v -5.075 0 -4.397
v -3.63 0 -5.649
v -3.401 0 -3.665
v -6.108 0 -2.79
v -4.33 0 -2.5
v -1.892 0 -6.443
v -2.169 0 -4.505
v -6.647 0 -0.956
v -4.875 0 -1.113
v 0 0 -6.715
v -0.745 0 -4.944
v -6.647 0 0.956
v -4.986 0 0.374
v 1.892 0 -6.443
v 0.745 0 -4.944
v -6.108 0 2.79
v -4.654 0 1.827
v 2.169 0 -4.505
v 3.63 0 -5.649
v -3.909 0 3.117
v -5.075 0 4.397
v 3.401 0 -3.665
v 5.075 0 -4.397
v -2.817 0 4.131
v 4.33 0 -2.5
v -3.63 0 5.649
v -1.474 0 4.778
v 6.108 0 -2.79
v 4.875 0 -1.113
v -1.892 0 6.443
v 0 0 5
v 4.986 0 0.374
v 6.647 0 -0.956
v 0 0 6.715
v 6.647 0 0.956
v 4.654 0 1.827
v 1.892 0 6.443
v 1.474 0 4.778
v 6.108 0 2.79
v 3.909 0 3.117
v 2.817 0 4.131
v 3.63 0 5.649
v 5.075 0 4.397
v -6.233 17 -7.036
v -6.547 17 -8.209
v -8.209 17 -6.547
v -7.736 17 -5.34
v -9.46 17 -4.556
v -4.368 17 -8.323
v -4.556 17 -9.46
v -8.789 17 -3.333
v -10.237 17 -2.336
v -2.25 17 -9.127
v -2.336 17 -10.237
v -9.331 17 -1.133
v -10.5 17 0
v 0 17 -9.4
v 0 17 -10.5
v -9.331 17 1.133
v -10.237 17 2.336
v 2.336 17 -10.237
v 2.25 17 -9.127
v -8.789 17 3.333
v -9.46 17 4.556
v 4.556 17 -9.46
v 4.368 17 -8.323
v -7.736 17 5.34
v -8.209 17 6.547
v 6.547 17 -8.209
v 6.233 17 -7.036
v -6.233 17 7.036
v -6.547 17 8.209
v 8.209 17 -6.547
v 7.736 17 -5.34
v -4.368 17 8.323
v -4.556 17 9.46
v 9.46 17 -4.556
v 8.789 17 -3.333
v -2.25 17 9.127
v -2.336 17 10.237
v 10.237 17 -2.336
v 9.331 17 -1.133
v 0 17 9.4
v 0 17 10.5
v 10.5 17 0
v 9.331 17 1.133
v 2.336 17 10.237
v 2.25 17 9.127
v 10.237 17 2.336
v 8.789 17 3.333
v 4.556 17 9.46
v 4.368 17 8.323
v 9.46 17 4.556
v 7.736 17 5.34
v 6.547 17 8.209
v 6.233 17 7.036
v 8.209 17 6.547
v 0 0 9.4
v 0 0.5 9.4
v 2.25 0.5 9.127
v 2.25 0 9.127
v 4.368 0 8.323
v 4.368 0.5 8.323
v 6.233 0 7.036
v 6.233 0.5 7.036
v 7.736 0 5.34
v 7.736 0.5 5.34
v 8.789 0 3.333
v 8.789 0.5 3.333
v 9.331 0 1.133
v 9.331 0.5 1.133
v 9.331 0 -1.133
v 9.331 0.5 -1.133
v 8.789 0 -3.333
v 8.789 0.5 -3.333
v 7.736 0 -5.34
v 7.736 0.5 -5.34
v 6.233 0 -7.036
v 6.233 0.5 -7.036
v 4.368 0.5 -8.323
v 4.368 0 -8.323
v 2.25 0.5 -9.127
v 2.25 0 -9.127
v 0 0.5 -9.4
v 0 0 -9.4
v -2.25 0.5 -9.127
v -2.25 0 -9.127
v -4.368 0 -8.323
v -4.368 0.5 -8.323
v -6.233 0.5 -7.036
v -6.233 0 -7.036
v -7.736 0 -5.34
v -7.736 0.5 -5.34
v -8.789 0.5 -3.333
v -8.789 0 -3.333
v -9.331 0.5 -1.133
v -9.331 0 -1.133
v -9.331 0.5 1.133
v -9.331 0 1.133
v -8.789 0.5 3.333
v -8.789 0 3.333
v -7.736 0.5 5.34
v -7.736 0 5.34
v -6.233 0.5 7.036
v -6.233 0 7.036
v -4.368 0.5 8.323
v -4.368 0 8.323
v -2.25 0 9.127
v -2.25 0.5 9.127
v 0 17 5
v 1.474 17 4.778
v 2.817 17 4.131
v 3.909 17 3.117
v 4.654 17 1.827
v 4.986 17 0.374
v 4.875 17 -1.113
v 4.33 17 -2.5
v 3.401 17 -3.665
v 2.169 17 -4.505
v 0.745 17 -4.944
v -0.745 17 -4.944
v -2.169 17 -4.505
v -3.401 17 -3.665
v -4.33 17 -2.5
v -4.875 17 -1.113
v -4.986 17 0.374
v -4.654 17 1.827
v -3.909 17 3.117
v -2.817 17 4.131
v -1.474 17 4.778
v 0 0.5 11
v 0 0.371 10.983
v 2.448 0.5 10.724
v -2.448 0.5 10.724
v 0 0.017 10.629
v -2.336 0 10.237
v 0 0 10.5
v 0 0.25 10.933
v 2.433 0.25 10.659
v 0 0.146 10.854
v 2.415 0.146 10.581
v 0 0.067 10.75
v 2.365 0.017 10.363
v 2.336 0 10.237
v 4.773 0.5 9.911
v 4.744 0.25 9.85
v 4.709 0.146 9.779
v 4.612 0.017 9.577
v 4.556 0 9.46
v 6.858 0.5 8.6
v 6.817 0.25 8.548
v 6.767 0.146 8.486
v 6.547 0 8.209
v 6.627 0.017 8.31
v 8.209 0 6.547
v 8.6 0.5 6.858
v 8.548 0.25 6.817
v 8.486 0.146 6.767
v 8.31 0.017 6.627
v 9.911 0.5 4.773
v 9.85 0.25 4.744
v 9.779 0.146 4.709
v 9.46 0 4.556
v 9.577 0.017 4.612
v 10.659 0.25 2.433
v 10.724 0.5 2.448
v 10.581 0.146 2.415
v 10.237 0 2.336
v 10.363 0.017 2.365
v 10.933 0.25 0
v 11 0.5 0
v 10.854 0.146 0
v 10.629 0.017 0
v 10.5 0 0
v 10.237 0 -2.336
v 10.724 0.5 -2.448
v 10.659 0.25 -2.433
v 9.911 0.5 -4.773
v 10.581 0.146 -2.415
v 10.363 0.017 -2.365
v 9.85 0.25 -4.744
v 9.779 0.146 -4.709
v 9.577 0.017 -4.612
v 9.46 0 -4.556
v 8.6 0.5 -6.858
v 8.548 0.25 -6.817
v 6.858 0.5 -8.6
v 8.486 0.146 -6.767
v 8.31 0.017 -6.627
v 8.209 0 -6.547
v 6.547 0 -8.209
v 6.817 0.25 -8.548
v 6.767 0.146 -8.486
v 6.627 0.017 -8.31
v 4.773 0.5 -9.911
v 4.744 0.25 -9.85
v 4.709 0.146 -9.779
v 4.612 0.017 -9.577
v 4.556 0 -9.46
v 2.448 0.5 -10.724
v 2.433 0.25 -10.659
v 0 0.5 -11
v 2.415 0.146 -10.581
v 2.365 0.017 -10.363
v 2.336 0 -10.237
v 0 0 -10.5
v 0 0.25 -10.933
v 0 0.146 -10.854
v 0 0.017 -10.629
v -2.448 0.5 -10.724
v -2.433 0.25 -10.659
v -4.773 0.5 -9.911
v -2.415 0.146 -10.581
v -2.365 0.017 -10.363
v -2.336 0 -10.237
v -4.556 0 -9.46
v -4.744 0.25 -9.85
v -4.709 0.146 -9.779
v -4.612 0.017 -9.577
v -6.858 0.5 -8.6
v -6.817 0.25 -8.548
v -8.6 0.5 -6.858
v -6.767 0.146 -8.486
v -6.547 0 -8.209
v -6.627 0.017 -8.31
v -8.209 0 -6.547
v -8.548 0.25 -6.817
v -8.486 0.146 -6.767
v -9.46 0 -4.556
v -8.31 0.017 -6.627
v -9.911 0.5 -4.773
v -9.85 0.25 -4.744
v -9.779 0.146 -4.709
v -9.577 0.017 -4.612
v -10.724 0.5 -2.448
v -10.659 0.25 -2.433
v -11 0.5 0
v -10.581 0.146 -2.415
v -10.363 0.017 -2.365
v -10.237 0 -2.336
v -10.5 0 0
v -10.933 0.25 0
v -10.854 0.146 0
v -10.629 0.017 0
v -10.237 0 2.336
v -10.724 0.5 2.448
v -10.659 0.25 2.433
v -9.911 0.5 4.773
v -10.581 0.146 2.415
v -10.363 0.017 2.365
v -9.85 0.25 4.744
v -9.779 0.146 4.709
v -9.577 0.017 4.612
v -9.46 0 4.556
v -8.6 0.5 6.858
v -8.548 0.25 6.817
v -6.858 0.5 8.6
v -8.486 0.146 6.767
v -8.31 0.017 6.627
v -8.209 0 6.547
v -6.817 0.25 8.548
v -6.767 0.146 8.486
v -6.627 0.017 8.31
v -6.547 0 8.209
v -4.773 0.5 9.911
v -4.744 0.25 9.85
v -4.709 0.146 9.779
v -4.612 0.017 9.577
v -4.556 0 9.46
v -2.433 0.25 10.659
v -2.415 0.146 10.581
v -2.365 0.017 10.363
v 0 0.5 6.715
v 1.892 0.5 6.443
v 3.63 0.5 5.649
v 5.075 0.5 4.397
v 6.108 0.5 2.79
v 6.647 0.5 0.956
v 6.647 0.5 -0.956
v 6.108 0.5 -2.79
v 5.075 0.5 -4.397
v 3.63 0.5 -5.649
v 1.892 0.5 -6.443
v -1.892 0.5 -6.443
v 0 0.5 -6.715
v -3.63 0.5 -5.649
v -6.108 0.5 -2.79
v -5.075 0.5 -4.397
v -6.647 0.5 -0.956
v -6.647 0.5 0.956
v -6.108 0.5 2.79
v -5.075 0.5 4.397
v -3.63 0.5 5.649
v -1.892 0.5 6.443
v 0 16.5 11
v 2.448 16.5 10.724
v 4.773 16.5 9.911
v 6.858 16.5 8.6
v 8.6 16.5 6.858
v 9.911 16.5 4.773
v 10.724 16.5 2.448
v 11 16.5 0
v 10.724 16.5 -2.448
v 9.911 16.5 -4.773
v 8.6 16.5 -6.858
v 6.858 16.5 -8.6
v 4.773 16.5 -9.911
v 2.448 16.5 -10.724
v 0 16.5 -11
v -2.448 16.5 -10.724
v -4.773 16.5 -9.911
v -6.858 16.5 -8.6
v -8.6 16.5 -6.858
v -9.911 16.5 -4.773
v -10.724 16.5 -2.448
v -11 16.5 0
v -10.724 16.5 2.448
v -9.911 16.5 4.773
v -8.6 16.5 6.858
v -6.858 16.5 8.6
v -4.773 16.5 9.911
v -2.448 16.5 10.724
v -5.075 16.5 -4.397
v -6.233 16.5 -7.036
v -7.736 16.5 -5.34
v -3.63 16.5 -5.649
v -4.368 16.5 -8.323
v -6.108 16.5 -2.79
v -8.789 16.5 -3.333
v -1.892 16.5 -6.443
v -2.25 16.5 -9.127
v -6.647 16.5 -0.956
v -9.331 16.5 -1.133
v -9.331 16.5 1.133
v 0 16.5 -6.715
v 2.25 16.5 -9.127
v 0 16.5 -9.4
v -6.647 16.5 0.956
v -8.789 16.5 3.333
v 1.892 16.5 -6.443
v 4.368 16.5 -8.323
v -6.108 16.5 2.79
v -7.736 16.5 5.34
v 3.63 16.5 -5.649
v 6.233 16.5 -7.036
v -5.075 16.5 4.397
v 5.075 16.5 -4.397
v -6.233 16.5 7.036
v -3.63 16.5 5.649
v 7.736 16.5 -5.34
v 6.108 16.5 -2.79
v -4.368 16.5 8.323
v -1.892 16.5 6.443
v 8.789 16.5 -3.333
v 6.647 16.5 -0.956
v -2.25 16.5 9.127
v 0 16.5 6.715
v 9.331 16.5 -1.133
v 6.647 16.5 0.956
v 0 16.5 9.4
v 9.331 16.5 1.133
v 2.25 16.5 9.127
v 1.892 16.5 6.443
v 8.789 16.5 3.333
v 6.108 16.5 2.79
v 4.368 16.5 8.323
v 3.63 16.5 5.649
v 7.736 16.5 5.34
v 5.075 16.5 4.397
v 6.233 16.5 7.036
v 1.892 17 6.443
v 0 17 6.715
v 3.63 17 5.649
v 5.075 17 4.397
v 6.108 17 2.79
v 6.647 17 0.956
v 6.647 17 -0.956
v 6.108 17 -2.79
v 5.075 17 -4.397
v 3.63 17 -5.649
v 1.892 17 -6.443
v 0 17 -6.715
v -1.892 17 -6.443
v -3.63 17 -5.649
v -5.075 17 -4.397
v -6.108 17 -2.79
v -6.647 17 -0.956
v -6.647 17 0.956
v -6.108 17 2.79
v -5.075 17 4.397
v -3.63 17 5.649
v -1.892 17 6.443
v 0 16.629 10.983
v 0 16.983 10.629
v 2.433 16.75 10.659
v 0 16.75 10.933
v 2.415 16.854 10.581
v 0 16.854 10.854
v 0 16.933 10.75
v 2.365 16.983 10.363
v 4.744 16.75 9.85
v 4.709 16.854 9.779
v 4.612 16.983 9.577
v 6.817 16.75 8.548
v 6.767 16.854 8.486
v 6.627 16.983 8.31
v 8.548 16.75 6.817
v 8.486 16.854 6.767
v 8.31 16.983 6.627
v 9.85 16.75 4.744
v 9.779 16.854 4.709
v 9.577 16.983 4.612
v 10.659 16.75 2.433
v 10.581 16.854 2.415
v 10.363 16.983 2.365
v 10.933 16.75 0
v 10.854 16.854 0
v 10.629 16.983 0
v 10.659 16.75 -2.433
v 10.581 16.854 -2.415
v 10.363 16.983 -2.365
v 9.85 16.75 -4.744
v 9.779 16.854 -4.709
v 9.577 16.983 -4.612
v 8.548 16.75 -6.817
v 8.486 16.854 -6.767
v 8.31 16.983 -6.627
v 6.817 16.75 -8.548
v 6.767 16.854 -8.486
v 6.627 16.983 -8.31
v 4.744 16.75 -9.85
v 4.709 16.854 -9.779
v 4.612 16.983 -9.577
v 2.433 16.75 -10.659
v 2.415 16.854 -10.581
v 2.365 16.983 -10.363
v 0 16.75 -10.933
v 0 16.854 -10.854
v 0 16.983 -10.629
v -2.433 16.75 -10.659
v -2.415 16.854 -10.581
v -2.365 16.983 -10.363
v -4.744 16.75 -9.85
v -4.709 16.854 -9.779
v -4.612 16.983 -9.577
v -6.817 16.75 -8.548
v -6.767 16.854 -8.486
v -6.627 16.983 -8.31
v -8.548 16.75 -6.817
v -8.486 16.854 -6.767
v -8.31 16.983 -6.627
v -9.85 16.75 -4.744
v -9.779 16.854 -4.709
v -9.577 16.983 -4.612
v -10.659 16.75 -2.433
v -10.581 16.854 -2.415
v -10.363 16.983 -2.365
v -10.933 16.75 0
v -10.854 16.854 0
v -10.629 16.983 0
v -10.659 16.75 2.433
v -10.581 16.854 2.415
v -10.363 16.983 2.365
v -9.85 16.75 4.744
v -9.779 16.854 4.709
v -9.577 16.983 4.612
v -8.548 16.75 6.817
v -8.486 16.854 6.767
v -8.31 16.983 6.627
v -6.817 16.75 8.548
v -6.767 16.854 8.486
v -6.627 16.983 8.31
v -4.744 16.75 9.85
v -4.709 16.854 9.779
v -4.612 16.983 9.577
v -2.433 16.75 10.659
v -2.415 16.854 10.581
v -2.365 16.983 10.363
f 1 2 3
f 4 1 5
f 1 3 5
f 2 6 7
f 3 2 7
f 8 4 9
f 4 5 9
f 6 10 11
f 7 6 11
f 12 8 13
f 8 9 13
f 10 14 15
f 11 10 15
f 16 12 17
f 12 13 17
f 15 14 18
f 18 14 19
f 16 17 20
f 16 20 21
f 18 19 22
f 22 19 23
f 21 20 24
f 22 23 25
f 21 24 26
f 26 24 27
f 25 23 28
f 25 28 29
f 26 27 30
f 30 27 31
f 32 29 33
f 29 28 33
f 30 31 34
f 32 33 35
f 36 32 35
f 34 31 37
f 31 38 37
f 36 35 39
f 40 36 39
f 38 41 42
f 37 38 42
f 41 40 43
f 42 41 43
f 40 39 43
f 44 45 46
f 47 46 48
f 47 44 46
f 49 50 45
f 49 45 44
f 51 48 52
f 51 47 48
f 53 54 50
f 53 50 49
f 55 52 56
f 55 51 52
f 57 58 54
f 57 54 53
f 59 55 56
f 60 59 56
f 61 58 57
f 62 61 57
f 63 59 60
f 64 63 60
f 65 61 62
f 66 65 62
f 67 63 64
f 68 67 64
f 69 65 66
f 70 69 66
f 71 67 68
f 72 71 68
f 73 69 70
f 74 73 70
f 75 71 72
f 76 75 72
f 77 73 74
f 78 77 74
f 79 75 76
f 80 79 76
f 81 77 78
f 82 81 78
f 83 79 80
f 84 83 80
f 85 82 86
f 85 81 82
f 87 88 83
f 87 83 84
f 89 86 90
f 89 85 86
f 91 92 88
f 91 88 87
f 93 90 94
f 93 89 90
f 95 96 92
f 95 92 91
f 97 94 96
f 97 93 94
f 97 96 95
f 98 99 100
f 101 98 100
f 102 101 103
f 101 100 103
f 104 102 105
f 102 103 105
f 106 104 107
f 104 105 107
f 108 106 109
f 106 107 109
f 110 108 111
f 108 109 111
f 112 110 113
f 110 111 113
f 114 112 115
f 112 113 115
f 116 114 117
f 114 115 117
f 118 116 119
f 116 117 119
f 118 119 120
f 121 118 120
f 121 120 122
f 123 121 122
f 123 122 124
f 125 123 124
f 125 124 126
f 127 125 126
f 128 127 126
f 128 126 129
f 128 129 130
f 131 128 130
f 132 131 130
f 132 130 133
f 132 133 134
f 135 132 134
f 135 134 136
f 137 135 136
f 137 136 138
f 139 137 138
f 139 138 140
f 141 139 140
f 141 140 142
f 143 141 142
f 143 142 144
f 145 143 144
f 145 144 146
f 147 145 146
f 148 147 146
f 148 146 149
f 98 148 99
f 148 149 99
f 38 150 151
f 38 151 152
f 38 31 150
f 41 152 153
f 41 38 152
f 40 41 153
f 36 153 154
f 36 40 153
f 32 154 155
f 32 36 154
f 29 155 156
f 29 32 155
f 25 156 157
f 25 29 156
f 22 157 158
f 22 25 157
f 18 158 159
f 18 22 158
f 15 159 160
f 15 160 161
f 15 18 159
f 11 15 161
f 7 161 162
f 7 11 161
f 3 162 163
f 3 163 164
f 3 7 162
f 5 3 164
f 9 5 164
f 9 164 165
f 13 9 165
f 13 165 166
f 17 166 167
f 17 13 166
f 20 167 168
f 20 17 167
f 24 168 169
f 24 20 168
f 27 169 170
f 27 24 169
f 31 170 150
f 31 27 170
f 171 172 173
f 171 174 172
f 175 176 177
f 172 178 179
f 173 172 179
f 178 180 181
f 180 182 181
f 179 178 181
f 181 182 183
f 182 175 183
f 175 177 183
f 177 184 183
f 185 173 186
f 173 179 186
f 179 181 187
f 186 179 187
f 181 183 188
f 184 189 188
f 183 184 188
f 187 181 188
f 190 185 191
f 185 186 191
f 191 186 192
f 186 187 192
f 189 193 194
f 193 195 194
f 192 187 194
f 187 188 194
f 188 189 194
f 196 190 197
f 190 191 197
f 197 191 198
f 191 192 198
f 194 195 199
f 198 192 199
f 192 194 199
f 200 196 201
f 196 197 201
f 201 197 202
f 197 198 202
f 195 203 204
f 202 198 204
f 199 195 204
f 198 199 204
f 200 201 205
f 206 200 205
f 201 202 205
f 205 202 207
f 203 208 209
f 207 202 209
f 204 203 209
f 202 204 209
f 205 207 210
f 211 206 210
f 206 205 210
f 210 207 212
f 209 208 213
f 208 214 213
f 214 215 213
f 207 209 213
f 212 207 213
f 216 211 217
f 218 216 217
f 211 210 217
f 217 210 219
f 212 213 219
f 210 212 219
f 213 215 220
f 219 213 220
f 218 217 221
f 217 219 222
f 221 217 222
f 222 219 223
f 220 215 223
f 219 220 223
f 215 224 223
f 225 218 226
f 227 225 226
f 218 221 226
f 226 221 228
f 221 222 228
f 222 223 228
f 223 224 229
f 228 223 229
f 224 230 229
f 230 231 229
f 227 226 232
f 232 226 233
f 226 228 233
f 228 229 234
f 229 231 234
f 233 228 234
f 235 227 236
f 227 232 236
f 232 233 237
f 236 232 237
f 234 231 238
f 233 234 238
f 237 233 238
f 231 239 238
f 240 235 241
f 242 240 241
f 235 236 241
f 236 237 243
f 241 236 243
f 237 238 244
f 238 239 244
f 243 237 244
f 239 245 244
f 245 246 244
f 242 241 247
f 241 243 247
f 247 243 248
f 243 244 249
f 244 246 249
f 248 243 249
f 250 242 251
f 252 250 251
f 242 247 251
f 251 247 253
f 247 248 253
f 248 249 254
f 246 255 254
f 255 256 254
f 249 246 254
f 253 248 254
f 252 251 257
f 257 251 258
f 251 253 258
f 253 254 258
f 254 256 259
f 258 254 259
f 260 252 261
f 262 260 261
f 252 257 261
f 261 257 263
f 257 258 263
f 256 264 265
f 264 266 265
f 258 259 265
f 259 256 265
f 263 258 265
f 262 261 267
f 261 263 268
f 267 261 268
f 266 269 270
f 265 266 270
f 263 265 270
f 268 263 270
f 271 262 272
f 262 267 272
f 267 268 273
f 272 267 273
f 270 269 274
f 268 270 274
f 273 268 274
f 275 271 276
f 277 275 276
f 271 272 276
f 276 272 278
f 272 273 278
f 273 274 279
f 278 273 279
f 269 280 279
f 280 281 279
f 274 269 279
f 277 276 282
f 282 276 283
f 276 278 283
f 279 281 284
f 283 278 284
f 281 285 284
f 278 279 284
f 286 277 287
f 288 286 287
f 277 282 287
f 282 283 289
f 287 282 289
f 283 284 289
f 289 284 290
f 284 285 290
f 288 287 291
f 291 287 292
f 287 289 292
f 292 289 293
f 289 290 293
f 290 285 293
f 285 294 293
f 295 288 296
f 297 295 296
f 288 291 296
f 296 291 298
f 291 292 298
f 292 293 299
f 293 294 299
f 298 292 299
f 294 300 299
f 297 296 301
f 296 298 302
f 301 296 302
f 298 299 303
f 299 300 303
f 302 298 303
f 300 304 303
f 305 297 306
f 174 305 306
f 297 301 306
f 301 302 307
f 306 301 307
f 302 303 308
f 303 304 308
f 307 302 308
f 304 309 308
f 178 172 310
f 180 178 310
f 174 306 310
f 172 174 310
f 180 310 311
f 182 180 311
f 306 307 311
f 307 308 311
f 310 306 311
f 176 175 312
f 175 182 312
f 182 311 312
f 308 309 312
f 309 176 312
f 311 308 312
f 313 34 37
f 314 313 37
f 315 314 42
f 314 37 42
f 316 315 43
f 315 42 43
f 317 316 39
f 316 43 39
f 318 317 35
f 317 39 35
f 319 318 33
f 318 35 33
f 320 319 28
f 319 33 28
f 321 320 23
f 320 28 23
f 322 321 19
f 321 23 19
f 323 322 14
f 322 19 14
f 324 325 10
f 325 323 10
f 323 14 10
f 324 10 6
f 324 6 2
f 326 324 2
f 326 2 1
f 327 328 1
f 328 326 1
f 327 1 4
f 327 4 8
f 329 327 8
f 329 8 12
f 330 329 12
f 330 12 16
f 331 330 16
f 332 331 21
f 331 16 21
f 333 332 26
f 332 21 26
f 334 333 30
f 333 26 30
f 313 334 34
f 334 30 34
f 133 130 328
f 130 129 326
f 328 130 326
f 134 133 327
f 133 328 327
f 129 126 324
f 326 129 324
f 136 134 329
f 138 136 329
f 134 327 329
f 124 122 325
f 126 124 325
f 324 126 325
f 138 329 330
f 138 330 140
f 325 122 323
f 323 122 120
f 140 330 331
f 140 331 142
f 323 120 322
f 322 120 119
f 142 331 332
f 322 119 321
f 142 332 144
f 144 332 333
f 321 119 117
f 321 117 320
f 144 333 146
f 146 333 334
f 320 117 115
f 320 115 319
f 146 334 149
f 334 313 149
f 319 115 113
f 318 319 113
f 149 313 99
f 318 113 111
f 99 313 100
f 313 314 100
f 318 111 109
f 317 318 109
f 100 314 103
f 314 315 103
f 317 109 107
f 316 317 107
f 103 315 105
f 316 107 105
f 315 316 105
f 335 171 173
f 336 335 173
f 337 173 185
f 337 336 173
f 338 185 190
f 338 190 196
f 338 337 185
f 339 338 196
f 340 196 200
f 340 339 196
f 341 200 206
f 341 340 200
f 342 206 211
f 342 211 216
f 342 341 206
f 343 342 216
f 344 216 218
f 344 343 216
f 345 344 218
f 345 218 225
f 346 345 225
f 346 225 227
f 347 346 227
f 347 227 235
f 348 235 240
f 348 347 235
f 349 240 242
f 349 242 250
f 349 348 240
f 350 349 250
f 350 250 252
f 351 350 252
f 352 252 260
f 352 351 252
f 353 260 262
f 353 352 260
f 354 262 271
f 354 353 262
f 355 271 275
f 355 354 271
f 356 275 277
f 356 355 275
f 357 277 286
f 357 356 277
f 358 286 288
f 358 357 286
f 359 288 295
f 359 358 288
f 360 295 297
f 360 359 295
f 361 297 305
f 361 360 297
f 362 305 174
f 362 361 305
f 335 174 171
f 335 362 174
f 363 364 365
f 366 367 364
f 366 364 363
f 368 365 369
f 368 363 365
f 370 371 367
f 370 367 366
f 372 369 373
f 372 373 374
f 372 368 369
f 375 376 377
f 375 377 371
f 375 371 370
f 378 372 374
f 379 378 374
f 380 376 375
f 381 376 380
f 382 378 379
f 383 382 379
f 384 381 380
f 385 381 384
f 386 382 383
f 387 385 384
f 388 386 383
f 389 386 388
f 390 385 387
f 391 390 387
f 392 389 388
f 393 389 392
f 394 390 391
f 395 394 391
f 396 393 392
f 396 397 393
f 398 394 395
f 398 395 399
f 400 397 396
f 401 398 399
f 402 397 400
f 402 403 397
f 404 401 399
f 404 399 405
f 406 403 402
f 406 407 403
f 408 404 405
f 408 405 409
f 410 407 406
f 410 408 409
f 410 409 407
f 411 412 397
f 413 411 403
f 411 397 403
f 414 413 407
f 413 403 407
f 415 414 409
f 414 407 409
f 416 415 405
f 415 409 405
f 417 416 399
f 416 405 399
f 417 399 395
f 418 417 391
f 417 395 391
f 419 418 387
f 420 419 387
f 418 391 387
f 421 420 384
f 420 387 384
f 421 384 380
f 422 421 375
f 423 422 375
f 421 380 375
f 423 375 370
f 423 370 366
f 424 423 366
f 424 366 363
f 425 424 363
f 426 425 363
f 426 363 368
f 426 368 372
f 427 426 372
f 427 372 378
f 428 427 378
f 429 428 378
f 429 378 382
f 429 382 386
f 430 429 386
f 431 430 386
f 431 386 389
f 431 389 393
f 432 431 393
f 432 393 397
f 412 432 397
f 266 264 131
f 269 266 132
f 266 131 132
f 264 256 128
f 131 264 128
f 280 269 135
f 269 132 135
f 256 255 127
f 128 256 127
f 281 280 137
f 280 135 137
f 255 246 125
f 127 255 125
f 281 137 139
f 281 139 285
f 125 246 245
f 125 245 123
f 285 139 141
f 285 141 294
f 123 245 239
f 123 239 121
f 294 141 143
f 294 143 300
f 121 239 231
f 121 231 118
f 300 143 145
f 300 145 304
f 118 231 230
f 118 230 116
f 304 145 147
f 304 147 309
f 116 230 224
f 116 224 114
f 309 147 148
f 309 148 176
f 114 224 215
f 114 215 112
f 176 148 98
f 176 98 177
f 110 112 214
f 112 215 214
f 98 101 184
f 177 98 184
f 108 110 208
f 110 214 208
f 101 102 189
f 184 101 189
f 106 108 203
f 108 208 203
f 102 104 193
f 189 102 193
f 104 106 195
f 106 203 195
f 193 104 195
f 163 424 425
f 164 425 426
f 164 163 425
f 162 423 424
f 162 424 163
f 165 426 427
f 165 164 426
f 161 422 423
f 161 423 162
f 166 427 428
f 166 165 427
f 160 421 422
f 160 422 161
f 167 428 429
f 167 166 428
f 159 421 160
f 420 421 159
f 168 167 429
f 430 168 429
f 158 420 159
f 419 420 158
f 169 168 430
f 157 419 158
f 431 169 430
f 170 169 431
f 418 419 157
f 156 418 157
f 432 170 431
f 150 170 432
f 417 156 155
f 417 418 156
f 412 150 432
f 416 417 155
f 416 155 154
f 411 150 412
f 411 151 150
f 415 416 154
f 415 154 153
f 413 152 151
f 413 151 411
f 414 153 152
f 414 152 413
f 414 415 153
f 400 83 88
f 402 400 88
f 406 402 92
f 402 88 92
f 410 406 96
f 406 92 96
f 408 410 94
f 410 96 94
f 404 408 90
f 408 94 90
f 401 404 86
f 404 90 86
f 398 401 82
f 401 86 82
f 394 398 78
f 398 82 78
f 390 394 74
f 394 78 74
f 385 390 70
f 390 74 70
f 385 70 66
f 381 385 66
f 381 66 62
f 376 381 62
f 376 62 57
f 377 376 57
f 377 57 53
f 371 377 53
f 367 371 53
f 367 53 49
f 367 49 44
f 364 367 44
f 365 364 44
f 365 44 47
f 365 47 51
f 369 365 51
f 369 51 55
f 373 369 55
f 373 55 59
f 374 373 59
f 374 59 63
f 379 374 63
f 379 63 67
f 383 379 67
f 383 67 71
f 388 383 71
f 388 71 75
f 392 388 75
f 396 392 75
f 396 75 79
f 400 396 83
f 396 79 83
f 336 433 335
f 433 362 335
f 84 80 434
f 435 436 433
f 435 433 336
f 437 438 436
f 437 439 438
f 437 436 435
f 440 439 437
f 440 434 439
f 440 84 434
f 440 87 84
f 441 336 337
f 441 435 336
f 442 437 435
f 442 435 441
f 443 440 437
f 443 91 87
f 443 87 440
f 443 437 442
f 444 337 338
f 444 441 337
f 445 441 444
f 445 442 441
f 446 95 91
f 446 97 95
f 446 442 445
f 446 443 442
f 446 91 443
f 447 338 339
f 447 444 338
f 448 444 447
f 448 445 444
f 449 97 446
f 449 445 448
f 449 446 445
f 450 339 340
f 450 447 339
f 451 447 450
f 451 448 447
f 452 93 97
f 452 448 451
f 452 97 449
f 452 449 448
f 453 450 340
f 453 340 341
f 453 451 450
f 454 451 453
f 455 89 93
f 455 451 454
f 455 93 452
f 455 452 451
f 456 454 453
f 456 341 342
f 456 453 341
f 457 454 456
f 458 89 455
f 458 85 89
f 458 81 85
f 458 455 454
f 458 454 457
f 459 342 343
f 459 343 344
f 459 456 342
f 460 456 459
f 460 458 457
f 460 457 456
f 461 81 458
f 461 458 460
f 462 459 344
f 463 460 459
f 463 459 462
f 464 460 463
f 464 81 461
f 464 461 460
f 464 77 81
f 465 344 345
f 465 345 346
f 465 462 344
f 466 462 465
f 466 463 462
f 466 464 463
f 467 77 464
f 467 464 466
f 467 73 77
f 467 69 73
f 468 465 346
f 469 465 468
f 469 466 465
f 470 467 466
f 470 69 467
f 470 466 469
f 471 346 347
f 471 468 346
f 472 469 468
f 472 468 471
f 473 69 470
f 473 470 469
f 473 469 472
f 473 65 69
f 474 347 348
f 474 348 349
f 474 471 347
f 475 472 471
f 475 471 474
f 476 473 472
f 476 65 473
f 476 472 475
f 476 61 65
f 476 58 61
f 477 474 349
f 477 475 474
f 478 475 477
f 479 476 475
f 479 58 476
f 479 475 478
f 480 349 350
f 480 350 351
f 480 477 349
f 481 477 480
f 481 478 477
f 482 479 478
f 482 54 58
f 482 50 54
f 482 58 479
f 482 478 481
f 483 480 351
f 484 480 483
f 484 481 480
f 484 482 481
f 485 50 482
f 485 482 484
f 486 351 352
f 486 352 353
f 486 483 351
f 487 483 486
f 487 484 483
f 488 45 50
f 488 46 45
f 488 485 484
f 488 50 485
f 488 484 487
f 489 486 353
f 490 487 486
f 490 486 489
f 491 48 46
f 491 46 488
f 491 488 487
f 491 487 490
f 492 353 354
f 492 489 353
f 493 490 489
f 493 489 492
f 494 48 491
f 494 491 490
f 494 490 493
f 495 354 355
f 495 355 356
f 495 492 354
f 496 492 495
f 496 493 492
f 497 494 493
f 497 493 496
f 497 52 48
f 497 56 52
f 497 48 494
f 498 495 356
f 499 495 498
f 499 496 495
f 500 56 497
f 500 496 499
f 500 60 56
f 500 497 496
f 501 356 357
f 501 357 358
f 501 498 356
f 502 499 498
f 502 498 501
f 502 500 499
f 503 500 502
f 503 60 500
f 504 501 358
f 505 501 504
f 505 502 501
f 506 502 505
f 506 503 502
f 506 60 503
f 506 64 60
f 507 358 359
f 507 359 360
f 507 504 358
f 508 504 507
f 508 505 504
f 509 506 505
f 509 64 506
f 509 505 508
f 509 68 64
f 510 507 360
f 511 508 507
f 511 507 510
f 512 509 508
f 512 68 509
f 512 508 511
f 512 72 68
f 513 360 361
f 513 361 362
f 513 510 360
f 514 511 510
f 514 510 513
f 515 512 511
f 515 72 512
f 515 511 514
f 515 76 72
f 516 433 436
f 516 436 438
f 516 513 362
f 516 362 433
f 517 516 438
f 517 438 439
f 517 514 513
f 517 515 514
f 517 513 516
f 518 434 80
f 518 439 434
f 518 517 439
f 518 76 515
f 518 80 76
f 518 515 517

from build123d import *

# Parameters (mm, degrees)
SKETCH1_R           = 6.715
SKETCH1_R_2         = 5
BOSS_EXTRUDE1_DEPTH = 17
SKETCH4_R           = 9.4
BOSS_EXTRUDE2_DEPTH = 8
SKETCH7_R           = 11
SKETCH7_R_2         = 9.4
BOSS_EXTRUDE3_DEPTH = 17
SKETCH8_R           = 5
CUT_EXTRUDE1_DEPTH  = 17
FILLET1_R           = 0.5


with BuildPart() as part:
    # Sketch1 → Boss-Extrude1 (new body)
    with BuildSketch(Plane(origin=(0, 0, 0), x_dir=(1, 0, 0), z_dir=(0, 1, 0))):
        with Locations(Location((0, 0, 0), (0, 0, 270))):
            Circle(SKETCH1_R)
        with Locations(Location((0, 0, 0), (0, 0, 270))):
            Circle(SKETCH1_R_2, mode=Mode.SUBTRACT)
    extrude(amount=BOSS_EXTRUDE1_DEPTH)

    # Sketch4 → Boss-Extrude2 (add, symmetric)
    with BuildSketch(Plane(origin=(0, 8.5, 0), x_dir=(1, 0, 0), z_dir=(0, 1, 0))):
        with Locations(Location((0, 0, 0), (0, 0, 270))):
            Circle(SKETCH4_R)
    extrude(amount=BOSS_EXTRUDE2_DEPTH, both=True)

    # Sketch7 → Boss-Extrude3 (add)
    with BuildSketch(Plane(origin=(0, 17, 0), x_dir=(1, 0, 0), z_dir=(0, 1, 0))):
        with Locations(Location((0, 0, 0), (0, 0, 270))):
            Circle(SKETCH7_R)
        with Locations(Location((0, 0, 0), (0, 0, 270))):
            Circle(SKETCH7_R_2, mode=Mode.SUBTRACT)
    extrude(amount=-BOSS_EXTRUDE3_DEPTH)

    # Sketch8 → Cut-Extrude1 (cut)
    with BuildSketch(Plane.XZ.offset(-0.5)):
        with Locations(Location((0, 0, 0), (0, 0, 90))):
            Circle(SKETCH8_R)
    extrude(amount=-CUT_EXTRUDE1_DEPTH, mode=Mode.SUBTRACT)

    # Fillet1
    fillet1_edges = [part.edges().sort_by_distance(p)[0] for p in [
        (0, 0, -11),
        (0, 17, -11),
    ]]
    fillet(fillet1_edges, radius=FILLET1_R)


solid = part.part
